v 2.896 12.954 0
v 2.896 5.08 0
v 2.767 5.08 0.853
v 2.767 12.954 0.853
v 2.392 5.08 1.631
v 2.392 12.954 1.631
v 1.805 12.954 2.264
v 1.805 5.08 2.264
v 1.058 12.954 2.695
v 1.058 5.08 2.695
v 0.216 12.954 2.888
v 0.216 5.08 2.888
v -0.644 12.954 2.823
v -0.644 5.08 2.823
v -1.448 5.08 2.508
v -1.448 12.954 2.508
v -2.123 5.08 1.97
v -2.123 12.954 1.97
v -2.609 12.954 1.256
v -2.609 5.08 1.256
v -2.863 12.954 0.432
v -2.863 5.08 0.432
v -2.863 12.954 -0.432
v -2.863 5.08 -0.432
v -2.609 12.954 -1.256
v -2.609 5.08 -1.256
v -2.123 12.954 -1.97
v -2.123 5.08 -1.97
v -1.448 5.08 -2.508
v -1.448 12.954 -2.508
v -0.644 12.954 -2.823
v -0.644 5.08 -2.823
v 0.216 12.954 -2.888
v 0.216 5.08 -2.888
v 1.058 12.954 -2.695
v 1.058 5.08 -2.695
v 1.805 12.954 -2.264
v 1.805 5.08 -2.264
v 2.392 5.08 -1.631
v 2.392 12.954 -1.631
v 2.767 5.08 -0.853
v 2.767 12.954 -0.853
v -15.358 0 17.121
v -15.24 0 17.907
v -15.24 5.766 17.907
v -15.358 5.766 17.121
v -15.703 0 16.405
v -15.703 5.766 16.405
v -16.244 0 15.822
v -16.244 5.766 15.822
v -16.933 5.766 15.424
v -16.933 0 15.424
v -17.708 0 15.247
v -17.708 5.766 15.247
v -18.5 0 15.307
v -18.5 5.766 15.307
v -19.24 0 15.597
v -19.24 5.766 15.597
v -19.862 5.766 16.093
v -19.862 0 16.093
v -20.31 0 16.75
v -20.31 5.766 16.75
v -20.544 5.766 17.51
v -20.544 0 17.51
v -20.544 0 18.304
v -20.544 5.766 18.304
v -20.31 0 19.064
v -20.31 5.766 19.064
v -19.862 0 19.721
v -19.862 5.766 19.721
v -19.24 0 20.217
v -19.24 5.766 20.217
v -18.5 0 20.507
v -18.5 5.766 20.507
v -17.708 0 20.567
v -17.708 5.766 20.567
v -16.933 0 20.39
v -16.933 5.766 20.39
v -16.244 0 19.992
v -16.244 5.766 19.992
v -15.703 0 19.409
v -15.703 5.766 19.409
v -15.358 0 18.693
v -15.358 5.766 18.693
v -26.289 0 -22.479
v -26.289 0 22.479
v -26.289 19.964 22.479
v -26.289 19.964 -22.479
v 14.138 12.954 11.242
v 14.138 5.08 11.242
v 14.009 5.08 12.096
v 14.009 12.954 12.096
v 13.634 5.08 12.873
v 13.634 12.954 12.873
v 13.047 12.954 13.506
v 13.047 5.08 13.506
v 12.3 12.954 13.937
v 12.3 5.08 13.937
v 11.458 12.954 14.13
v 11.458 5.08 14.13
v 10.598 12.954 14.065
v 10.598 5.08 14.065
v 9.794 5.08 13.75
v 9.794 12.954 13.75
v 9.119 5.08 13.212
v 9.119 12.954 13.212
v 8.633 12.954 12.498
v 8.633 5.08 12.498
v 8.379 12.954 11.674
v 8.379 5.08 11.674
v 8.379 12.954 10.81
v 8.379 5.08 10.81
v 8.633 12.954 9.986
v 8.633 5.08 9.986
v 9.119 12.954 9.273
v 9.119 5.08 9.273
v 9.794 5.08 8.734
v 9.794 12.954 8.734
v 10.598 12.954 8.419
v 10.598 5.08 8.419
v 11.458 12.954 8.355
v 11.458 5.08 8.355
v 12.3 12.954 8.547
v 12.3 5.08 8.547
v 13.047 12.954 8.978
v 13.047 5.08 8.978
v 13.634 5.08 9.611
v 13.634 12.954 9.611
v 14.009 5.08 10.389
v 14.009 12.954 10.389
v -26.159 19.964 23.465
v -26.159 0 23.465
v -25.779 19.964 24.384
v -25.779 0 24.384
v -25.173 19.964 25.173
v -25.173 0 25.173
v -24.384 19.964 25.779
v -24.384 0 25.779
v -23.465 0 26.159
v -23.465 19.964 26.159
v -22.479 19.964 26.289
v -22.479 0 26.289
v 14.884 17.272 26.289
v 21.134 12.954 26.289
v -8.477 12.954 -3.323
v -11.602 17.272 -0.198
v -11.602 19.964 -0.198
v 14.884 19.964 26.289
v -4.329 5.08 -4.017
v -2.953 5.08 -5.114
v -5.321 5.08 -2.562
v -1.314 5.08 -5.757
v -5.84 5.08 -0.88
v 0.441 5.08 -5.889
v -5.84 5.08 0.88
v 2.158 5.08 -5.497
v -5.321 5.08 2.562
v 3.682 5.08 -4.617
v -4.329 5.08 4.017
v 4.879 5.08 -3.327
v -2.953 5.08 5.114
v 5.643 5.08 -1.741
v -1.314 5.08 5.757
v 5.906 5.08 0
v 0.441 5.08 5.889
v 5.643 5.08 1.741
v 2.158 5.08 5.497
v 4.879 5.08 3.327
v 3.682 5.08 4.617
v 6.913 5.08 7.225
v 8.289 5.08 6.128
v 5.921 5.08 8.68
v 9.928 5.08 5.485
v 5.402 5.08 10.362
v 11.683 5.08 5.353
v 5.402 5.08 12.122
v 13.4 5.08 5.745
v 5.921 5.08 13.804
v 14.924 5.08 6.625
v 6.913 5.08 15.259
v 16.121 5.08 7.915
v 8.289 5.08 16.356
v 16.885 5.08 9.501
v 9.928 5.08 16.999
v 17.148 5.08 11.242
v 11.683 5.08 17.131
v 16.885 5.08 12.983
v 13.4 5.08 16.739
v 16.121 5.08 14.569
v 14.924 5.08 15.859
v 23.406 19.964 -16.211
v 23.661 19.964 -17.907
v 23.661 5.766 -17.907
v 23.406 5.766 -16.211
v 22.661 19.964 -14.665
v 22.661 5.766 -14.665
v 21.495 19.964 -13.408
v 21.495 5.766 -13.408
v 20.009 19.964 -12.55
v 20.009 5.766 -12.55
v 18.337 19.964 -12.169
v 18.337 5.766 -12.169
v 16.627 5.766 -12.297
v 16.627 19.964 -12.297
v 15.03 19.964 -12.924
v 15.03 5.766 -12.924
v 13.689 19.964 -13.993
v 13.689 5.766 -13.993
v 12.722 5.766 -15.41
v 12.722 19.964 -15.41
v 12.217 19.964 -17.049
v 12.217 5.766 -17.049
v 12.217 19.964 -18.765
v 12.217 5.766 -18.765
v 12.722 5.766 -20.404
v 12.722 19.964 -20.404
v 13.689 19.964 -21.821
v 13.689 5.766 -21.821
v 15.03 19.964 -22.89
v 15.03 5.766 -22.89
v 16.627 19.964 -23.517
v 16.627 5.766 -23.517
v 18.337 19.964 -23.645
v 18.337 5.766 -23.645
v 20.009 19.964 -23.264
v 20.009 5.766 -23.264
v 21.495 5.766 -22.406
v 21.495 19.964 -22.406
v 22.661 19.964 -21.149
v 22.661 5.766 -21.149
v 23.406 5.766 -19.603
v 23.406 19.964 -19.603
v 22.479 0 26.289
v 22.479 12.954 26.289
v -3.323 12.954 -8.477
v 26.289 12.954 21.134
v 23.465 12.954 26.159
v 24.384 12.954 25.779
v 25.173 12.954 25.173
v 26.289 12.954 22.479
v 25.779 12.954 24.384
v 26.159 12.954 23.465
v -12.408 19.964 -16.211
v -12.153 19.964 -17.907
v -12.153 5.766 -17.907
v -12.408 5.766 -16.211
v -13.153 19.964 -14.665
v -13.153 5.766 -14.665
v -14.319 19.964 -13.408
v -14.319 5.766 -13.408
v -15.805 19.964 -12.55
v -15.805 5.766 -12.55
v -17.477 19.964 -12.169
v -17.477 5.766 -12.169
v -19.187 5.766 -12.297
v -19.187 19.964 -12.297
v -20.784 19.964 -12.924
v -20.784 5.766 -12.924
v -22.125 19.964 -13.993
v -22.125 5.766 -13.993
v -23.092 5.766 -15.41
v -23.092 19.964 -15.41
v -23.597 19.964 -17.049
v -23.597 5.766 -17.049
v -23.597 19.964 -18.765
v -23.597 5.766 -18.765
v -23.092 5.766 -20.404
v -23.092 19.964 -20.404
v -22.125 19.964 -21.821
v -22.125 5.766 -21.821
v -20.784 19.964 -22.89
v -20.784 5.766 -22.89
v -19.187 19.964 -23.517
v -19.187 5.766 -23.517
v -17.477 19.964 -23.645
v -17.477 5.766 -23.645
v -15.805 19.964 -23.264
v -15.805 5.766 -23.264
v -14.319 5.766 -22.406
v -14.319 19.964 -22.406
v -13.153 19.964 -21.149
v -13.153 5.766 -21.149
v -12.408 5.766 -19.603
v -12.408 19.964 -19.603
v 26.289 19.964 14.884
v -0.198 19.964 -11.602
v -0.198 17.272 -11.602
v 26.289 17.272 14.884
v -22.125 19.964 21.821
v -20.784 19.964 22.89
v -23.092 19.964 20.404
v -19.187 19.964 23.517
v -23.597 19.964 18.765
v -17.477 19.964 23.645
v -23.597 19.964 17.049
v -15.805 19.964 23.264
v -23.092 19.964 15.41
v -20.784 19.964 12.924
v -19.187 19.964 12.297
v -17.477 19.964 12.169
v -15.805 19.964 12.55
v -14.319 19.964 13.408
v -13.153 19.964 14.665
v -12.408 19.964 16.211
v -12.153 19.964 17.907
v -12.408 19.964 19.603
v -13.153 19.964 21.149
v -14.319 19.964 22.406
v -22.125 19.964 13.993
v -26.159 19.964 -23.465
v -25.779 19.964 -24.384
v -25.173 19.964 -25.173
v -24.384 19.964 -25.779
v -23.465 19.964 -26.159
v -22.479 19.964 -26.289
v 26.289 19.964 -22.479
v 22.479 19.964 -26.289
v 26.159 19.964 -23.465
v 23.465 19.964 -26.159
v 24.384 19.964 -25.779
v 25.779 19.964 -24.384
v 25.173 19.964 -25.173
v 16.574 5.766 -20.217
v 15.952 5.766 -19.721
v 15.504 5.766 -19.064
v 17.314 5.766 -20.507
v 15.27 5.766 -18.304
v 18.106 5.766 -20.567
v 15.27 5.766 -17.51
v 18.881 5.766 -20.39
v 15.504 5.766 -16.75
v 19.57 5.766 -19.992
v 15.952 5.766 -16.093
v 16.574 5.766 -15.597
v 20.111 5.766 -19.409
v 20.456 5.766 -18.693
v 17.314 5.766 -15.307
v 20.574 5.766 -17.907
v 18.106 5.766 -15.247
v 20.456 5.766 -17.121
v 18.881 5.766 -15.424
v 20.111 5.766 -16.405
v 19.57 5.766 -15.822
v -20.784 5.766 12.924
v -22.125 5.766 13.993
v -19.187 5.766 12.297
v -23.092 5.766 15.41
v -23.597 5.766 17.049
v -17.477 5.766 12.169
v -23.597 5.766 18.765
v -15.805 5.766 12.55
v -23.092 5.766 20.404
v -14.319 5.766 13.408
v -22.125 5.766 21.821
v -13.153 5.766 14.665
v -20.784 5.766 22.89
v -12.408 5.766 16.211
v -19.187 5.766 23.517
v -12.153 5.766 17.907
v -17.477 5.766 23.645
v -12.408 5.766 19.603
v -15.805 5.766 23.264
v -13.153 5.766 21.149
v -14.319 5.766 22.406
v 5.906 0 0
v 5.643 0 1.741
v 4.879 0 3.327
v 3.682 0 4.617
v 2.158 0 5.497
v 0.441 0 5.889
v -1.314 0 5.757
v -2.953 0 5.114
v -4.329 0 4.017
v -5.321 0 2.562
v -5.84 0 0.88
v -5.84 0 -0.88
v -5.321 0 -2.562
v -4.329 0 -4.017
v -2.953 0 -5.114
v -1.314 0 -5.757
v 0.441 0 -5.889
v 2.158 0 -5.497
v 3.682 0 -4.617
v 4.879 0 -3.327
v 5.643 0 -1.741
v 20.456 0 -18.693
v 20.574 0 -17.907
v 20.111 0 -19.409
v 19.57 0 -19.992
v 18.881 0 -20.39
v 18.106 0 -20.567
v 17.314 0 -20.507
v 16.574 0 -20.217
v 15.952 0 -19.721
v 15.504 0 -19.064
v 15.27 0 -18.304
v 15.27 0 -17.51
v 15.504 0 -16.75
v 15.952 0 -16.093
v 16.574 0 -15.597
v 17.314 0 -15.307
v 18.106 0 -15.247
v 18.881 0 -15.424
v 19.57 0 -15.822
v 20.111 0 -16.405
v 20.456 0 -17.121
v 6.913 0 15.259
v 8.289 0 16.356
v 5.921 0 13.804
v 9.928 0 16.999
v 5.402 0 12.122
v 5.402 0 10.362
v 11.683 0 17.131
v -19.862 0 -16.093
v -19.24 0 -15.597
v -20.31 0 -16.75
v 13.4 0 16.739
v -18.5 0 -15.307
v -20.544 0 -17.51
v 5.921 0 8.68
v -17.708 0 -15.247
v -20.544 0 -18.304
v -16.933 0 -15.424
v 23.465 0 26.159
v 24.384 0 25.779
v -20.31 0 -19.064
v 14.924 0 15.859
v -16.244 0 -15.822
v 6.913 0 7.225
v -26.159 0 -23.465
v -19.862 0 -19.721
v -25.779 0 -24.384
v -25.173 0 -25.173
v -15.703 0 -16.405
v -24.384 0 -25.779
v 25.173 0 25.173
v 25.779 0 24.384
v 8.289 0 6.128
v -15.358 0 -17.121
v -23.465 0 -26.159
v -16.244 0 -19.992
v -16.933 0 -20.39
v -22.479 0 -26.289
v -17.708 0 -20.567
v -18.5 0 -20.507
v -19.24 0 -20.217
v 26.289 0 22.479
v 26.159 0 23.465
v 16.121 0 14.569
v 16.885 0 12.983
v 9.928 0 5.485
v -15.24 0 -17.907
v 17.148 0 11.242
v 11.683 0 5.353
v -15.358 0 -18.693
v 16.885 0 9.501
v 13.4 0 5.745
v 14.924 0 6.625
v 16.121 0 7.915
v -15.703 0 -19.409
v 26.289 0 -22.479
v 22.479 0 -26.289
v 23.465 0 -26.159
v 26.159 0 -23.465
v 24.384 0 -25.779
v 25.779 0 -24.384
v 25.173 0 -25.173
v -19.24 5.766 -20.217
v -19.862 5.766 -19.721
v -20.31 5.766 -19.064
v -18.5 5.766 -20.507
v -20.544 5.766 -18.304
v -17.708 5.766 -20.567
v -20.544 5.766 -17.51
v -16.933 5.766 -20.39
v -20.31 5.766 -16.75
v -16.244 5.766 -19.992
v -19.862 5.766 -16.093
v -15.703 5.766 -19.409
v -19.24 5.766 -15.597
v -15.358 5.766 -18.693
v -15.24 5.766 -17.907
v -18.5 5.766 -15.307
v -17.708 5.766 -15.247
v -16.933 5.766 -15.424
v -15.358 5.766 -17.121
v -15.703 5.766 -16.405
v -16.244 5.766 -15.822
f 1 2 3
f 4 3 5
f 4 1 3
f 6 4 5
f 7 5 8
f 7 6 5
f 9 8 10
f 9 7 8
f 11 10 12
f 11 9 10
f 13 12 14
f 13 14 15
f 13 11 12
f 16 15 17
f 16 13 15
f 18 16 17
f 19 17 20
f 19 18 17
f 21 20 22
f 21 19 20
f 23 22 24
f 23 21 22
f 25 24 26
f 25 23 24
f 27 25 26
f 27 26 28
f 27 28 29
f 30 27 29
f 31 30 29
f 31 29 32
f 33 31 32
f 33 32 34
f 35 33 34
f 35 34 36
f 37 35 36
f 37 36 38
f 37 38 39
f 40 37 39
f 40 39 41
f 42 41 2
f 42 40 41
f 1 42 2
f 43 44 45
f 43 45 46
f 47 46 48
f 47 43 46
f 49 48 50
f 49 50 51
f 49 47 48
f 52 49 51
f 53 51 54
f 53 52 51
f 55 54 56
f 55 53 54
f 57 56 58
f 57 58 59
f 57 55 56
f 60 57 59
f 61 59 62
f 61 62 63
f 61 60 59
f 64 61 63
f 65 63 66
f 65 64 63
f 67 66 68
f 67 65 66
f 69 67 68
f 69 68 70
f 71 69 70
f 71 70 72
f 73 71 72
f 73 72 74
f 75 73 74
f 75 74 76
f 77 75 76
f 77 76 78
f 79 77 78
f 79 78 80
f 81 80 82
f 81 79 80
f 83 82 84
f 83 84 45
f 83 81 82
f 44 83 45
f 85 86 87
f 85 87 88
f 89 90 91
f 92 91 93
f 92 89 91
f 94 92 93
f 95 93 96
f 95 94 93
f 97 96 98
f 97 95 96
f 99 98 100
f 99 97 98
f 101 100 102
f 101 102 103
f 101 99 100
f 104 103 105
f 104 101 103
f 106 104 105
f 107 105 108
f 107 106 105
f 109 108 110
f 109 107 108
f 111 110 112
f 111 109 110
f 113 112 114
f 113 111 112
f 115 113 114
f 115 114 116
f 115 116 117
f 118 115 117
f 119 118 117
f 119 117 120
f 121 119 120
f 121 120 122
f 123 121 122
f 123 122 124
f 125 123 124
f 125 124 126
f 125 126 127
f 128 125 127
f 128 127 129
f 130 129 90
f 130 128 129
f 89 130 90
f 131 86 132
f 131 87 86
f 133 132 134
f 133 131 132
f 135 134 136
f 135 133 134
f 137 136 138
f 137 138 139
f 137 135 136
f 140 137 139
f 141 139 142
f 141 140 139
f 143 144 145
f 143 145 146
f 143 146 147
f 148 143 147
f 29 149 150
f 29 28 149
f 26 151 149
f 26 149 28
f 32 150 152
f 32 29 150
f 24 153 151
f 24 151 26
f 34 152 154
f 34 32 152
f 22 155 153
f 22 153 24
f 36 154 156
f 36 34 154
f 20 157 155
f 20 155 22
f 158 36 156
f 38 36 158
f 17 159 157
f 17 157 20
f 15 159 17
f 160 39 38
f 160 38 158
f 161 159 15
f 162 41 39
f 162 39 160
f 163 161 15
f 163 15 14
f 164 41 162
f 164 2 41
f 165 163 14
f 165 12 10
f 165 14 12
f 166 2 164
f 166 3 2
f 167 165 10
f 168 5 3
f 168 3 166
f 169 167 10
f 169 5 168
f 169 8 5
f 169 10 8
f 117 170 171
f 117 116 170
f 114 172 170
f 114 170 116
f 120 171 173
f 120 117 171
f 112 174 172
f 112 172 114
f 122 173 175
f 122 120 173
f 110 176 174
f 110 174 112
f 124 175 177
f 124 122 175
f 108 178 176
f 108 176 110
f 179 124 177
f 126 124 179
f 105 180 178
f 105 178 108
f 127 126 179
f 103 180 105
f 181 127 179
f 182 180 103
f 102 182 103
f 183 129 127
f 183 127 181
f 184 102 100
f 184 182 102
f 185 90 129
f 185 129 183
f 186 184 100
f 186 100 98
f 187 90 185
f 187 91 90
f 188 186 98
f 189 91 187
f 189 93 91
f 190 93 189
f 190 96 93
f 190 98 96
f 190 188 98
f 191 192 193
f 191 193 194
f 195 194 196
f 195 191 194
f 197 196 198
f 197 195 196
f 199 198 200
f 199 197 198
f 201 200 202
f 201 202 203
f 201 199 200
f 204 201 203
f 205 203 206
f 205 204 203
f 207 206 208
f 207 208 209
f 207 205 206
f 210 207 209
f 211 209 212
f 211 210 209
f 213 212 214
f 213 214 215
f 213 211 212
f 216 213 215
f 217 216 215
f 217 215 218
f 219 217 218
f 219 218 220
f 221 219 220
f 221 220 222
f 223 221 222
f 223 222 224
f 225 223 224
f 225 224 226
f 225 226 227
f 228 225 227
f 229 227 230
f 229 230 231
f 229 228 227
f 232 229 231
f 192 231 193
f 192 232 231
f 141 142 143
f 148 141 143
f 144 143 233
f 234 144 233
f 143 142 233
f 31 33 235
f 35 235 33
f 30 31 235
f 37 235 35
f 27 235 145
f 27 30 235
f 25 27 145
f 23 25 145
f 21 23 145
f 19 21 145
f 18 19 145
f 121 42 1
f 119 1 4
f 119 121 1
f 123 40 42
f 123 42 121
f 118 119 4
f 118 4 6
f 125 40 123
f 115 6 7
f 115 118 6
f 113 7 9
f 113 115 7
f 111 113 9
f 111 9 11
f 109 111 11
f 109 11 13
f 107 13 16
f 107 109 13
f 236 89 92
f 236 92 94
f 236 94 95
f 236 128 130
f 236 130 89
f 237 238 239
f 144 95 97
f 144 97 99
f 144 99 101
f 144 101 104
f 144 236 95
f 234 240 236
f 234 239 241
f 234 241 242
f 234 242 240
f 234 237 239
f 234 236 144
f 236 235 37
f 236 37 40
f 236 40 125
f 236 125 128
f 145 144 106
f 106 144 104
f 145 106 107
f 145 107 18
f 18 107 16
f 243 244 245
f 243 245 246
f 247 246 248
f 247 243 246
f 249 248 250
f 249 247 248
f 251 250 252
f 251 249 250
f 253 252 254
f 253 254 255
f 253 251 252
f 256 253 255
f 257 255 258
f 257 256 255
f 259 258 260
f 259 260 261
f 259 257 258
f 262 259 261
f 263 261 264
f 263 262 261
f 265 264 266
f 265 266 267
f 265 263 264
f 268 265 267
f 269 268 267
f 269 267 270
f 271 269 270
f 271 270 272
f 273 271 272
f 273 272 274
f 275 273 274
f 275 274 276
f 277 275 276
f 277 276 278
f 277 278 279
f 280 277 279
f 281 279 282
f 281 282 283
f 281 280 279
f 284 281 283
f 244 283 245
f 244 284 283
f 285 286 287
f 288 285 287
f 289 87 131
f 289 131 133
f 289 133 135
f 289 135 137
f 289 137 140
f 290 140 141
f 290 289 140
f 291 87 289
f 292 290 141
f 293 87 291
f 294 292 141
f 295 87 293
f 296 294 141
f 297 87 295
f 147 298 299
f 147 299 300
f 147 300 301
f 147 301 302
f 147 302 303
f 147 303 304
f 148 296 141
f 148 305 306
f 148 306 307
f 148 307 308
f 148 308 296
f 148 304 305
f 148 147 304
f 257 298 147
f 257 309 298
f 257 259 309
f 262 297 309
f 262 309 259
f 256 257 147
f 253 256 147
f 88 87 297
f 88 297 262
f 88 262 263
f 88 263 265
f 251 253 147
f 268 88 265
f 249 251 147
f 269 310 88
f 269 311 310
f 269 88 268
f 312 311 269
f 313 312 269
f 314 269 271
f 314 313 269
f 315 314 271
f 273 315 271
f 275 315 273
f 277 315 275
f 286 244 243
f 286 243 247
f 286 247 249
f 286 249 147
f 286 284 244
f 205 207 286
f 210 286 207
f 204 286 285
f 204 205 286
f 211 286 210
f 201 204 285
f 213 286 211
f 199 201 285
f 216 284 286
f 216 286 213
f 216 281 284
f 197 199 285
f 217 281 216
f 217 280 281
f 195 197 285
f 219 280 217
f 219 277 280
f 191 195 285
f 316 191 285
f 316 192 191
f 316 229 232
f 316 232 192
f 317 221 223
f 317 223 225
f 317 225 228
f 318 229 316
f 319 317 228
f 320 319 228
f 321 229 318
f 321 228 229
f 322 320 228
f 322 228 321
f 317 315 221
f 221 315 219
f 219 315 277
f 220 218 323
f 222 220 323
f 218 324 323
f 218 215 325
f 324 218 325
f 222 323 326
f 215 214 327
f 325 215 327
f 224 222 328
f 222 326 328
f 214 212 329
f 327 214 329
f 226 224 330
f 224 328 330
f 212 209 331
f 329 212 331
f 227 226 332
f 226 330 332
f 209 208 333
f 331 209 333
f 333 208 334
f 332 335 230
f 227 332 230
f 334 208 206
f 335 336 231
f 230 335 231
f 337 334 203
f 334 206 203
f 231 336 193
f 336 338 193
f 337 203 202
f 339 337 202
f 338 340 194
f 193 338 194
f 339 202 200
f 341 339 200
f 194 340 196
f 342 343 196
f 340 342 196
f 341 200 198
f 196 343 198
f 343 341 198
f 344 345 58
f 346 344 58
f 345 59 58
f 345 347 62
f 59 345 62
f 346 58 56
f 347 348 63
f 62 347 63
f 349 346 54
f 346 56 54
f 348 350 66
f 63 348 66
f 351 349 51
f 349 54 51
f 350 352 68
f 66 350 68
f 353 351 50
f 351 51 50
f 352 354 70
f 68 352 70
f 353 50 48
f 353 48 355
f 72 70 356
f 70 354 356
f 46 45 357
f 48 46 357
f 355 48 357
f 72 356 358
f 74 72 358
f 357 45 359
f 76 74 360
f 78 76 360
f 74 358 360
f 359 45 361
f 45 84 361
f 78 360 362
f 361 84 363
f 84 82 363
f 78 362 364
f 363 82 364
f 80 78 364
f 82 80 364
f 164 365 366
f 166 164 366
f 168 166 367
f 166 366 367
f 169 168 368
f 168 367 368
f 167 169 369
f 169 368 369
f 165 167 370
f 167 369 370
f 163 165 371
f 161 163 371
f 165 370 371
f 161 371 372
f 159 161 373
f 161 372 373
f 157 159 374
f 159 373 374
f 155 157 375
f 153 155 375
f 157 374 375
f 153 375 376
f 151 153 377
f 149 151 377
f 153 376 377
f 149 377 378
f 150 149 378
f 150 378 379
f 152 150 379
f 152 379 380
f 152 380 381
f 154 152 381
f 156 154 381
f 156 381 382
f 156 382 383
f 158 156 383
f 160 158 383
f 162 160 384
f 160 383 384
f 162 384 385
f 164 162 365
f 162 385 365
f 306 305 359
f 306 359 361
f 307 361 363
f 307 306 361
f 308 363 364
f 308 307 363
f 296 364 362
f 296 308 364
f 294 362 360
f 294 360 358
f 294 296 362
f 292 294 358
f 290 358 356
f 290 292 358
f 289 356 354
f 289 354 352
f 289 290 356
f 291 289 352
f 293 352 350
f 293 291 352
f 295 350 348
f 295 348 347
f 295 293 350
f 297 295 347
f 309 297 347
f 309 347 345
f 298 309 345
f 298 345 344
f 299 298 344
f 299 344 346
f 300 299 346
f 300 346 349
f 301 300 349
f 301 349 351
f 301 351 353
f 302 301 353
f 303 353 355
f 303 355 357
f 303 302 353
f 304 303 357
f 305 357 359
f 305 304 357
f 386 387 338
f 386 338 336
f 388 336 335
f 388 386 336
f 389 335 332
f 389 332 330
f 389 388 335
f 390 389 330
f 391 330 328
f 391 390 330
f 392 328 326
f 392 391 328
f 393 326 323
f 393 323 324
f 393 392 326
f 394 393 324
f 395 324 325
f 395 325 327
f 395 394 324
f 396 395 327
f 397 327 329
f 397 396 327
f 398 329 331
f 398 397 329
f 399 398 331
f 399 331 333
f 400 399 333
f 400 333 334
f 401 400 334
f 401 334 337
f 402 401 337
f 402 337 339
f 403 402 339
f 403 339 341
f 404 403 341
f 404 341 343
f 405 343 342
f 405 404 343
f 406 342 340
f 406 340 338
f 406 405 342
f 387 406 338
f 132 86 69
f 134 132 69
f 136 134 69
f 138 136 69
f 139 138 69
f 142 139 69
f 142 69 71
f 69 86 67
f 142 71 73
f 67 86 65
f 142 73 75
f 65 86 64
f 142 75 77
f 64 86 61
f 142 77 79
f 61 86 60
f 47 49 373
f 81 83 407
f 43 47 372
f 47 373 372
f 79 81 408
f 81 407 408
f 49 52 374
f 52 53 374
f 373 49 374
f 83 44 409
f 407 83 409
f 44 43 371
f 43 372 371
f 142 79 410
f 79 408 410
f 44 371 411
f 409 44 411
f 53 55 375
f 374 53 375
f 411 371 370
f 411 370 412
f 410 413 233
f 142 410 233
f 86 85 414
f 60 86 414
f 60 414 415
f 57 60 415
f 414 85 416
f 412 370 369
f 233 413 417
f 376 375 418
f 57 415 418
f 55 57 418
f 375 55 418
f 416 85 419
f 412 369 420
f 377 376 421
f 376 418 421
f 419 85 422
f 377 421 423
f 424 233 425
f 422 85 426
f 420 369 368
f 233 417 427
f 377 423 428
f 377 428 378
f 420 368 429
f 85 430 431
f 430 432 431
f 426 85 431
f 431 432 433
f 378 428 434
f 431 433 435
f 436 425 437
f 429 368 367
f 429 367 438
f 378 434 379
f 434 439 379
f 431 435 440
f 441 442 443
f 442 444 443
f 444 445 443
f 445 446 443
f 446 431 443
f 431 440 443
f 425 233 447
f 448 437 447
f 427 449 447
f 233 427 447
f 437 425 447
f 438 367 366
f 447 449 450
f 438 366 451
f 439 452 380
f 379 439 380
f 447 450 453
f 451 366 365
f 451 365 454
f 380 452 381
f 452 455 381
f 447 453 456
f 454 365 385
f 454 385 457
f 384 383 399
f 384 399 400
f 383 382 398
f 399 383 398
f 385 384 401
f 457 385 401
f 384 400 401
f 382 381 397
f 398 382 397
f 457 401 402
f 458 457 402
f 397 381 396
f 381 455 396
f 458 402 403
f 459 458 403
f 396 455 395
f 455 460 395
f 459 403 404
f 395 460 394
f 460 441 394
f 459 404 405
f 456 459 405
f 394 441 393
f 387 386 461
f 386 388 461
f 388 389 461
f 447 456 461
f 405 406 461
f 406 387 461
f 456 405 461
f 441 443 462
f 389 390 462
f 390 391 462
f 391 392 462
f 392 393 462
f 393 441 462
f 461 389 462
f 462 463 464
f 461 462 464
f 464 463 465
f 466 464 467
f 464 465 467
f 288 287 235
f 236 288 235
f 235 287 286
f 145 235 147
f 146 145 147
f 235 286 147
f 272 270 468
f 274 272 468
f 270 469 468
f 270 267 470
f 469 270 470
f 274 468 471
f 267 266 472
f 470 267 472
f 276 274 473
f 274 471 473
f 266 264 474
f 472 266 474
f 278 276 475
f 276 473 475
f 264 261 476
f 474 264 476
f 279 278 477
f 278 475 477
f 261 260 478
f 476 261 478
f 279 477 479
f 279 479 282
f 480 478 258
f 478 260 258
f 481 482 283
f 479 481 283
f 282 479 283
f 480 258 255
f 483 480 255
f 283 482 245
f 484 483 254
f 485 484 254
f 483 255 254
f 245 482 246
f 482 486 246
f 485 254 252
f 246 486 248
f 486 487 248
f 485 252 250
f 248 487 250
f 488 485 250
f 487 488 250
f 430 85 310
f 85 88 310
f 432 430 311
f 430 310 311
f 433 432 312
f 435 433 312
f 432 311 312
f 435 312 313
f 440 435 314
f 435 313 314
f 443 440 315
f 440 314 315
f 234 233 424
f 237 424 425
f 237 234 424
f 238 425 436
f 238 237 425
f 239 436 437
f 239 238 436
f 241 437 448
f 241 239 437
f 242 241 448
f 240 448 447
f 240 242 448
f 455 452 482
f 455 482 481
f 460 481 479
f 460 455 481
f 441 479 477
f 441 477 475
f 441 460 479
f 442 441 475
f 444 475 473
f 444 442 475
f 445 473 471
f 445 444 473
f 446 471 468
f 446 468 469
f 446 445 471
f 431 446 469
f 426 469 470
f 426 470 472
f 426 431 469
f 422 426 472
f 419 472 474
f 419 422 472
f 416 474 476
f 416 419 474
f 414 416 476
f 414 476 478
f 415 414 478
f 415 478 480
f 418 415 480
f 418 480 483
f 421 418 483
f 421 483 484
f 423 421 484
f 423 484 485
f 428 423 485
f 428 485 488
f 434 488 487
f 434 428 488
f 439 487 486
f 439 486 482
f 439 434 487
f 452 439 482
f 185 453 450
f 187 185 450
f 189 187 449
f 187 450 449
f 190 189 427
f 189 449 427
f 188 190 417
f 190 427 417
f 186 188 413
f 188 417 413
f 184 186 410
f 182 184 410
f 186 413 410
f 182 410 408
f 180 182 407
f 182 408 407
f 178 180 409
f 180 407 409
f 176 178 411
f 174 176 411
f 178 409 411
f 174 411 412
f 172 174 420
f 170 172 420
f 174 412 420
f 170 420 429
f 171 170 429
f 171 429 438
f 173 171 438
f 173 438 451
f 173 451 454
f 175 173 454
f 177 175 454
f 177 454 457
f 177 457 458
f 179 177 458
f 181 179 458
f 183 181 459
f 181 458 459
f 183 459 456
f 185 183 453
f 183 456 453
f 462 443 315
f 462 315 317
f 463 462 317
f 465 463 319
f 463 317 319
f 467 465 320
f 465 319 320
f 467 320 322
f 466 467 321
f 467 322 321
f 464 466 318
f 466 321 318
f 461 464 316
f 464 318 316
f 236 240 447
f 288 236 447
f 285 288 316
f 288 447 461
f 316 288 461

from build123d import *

# Parameters (mm, degrees)
SKETCH1_W       = 52.578
SKETCH1_H       = 52.578
EXTRUDE1_DEPTH  = 19.9644
EXTRUDE2_START  = -19.9644
SKETCH2_R       = 2.667
EXTRUDE2_DEPTH  = 5.7658
EXTRUDE4_START  = -19.9644
SKETCH6_R       = 5.75437
EXTRUDE4_DEPTH  = 14.1986
EXTRUDE6_START  = -45.52216
EXTRUDE6_DEPTH  = 45.52216
EXTRUDE10_START = -12.954
SKETCH15_R      = 2.8956
EXTRUDE10_DEPTH = 7.874
SKETCH16_R      = 5.9055
EXTRUDE11_DEPTH = 5.08
FILLET2_R       = 3.81
SKETCH12_R      = 5.08
EXTRUDE9_DEPTH  = 5.08


with BuildPart() as part:
    # Sketch1 → Extrude1 (new body)
    with BuildSketch(Plane(origin=(0, 0, 0), x_dir=(1, 0, 0), z_dir=(0, 1, 0))):
        Rectangle(SKETCH1_W, SKETCH1_H)
    extrude(amount=EXTRUDE1_DEPTH)

    # Sketch2 → Extrude2 (cut)
    with BuildSketch(Plane(origin=(0, 19.9644, 0), x_dir=(1, 0, 0), z_dir=(0, 1, 0)).offset(EXTRUDE2_START)):
        with Locations((-17.907, 17.907)):
            Circle(SKETCH2_R)
        with Locations((-17.907, -17.907)):
            Circle(SKETCH2_R)
        with Locations((17.907, 17.907)):
            Circle(SKETCH2_R)
    extrude(amount=EXTRUDE2_DEPTH, mode=Mode.SUBTRACT)

    # Sketch6 → Extrude4 (cut)
    with BuildSketch(Plane.XZ.offset(EXTRUDE4_START)):
        with Locations((-17.907, -17.907)):
            Circle(SKETCH6_R)
        with Locations((-17.907, 17.907)):
            Circle(SKETCH6_R)
        with Locations((17.907, -17.907)):
            Circle(SKETCH6_R)
    extrude(amount=EXTRUDE4_DEPTH, mode=Mode.SUBTRACT)

    # Sketch10 → Extrude6 (cut)
    with BuildSketch(Plane(origin=(-5.900028272, 0, -5.900028272), x_dir=(-0.707106781, 0, 0.707106781), z_dir=(-0.707106781, 0, -0.707106781)).offset(EXTRUDE6_START)):
        Polygon((-8.0645, 19.9644), (-8.0645, 17.272), (-3.6449, 12.954), (3.6449, 12.954), (8.0645, 17.272), (8.0645, 19.9644), align=None)
    extrude(amount=EXTRUDE6_DEPTH, mode=Mode.SUBTRACT)

    # Sketch15 → Extrude10 (cut)
    with BuildSketch(Plane.XZ.offset(EXTRUDE10_START)):
        Circle(SKETCH15_R)
        with Locations((11.24204, 11.24204)):
            Circle(SKETCH15_R)
    extrude(amount=EXTRUDE10_DEPTH, mode=Mode.SUBTRACT)

    # Sketch16 → Extrude11 (cut)
    with BuildSketch(Plane.XZ):
        Circle(SKETCH16_R)
        with Locations((11.24204, 11.24204)):
            Circle(SKETCH16_R)
    extrude(amount=-EXTRUDE11_DEPTH, mode=Mode.SUBTRACT)

    # Fillet2
    fillet2_edges = [part.edges().sort_by_distance(p)[0] for p in [
        (26.289, 6.477, 26.289),
        (-26.289, 9.9822, -26.289),
        (26.289, 9.9822, -26.289),
        (-26.289, 9.9822, 26.289),
    ]]
    fillet(fillet2_edges, radius=FILLET2_R)

    # Sketch12 → Extrude9 (cut)
    with BuildSketch(Plane(origin=(0, 19.9644, 0), x_dir=(1, 0, 0), z_dir=(0, 1, 0))):
        Circle(SKETCH12_R)
        with Locations((15.9004, -15.9004)):
            Circle(SKETCH12_R)
    extrude(amount=EXTRUDE9_DEPTH, mode=Mode.SUBTRACT)


solid = part.part
